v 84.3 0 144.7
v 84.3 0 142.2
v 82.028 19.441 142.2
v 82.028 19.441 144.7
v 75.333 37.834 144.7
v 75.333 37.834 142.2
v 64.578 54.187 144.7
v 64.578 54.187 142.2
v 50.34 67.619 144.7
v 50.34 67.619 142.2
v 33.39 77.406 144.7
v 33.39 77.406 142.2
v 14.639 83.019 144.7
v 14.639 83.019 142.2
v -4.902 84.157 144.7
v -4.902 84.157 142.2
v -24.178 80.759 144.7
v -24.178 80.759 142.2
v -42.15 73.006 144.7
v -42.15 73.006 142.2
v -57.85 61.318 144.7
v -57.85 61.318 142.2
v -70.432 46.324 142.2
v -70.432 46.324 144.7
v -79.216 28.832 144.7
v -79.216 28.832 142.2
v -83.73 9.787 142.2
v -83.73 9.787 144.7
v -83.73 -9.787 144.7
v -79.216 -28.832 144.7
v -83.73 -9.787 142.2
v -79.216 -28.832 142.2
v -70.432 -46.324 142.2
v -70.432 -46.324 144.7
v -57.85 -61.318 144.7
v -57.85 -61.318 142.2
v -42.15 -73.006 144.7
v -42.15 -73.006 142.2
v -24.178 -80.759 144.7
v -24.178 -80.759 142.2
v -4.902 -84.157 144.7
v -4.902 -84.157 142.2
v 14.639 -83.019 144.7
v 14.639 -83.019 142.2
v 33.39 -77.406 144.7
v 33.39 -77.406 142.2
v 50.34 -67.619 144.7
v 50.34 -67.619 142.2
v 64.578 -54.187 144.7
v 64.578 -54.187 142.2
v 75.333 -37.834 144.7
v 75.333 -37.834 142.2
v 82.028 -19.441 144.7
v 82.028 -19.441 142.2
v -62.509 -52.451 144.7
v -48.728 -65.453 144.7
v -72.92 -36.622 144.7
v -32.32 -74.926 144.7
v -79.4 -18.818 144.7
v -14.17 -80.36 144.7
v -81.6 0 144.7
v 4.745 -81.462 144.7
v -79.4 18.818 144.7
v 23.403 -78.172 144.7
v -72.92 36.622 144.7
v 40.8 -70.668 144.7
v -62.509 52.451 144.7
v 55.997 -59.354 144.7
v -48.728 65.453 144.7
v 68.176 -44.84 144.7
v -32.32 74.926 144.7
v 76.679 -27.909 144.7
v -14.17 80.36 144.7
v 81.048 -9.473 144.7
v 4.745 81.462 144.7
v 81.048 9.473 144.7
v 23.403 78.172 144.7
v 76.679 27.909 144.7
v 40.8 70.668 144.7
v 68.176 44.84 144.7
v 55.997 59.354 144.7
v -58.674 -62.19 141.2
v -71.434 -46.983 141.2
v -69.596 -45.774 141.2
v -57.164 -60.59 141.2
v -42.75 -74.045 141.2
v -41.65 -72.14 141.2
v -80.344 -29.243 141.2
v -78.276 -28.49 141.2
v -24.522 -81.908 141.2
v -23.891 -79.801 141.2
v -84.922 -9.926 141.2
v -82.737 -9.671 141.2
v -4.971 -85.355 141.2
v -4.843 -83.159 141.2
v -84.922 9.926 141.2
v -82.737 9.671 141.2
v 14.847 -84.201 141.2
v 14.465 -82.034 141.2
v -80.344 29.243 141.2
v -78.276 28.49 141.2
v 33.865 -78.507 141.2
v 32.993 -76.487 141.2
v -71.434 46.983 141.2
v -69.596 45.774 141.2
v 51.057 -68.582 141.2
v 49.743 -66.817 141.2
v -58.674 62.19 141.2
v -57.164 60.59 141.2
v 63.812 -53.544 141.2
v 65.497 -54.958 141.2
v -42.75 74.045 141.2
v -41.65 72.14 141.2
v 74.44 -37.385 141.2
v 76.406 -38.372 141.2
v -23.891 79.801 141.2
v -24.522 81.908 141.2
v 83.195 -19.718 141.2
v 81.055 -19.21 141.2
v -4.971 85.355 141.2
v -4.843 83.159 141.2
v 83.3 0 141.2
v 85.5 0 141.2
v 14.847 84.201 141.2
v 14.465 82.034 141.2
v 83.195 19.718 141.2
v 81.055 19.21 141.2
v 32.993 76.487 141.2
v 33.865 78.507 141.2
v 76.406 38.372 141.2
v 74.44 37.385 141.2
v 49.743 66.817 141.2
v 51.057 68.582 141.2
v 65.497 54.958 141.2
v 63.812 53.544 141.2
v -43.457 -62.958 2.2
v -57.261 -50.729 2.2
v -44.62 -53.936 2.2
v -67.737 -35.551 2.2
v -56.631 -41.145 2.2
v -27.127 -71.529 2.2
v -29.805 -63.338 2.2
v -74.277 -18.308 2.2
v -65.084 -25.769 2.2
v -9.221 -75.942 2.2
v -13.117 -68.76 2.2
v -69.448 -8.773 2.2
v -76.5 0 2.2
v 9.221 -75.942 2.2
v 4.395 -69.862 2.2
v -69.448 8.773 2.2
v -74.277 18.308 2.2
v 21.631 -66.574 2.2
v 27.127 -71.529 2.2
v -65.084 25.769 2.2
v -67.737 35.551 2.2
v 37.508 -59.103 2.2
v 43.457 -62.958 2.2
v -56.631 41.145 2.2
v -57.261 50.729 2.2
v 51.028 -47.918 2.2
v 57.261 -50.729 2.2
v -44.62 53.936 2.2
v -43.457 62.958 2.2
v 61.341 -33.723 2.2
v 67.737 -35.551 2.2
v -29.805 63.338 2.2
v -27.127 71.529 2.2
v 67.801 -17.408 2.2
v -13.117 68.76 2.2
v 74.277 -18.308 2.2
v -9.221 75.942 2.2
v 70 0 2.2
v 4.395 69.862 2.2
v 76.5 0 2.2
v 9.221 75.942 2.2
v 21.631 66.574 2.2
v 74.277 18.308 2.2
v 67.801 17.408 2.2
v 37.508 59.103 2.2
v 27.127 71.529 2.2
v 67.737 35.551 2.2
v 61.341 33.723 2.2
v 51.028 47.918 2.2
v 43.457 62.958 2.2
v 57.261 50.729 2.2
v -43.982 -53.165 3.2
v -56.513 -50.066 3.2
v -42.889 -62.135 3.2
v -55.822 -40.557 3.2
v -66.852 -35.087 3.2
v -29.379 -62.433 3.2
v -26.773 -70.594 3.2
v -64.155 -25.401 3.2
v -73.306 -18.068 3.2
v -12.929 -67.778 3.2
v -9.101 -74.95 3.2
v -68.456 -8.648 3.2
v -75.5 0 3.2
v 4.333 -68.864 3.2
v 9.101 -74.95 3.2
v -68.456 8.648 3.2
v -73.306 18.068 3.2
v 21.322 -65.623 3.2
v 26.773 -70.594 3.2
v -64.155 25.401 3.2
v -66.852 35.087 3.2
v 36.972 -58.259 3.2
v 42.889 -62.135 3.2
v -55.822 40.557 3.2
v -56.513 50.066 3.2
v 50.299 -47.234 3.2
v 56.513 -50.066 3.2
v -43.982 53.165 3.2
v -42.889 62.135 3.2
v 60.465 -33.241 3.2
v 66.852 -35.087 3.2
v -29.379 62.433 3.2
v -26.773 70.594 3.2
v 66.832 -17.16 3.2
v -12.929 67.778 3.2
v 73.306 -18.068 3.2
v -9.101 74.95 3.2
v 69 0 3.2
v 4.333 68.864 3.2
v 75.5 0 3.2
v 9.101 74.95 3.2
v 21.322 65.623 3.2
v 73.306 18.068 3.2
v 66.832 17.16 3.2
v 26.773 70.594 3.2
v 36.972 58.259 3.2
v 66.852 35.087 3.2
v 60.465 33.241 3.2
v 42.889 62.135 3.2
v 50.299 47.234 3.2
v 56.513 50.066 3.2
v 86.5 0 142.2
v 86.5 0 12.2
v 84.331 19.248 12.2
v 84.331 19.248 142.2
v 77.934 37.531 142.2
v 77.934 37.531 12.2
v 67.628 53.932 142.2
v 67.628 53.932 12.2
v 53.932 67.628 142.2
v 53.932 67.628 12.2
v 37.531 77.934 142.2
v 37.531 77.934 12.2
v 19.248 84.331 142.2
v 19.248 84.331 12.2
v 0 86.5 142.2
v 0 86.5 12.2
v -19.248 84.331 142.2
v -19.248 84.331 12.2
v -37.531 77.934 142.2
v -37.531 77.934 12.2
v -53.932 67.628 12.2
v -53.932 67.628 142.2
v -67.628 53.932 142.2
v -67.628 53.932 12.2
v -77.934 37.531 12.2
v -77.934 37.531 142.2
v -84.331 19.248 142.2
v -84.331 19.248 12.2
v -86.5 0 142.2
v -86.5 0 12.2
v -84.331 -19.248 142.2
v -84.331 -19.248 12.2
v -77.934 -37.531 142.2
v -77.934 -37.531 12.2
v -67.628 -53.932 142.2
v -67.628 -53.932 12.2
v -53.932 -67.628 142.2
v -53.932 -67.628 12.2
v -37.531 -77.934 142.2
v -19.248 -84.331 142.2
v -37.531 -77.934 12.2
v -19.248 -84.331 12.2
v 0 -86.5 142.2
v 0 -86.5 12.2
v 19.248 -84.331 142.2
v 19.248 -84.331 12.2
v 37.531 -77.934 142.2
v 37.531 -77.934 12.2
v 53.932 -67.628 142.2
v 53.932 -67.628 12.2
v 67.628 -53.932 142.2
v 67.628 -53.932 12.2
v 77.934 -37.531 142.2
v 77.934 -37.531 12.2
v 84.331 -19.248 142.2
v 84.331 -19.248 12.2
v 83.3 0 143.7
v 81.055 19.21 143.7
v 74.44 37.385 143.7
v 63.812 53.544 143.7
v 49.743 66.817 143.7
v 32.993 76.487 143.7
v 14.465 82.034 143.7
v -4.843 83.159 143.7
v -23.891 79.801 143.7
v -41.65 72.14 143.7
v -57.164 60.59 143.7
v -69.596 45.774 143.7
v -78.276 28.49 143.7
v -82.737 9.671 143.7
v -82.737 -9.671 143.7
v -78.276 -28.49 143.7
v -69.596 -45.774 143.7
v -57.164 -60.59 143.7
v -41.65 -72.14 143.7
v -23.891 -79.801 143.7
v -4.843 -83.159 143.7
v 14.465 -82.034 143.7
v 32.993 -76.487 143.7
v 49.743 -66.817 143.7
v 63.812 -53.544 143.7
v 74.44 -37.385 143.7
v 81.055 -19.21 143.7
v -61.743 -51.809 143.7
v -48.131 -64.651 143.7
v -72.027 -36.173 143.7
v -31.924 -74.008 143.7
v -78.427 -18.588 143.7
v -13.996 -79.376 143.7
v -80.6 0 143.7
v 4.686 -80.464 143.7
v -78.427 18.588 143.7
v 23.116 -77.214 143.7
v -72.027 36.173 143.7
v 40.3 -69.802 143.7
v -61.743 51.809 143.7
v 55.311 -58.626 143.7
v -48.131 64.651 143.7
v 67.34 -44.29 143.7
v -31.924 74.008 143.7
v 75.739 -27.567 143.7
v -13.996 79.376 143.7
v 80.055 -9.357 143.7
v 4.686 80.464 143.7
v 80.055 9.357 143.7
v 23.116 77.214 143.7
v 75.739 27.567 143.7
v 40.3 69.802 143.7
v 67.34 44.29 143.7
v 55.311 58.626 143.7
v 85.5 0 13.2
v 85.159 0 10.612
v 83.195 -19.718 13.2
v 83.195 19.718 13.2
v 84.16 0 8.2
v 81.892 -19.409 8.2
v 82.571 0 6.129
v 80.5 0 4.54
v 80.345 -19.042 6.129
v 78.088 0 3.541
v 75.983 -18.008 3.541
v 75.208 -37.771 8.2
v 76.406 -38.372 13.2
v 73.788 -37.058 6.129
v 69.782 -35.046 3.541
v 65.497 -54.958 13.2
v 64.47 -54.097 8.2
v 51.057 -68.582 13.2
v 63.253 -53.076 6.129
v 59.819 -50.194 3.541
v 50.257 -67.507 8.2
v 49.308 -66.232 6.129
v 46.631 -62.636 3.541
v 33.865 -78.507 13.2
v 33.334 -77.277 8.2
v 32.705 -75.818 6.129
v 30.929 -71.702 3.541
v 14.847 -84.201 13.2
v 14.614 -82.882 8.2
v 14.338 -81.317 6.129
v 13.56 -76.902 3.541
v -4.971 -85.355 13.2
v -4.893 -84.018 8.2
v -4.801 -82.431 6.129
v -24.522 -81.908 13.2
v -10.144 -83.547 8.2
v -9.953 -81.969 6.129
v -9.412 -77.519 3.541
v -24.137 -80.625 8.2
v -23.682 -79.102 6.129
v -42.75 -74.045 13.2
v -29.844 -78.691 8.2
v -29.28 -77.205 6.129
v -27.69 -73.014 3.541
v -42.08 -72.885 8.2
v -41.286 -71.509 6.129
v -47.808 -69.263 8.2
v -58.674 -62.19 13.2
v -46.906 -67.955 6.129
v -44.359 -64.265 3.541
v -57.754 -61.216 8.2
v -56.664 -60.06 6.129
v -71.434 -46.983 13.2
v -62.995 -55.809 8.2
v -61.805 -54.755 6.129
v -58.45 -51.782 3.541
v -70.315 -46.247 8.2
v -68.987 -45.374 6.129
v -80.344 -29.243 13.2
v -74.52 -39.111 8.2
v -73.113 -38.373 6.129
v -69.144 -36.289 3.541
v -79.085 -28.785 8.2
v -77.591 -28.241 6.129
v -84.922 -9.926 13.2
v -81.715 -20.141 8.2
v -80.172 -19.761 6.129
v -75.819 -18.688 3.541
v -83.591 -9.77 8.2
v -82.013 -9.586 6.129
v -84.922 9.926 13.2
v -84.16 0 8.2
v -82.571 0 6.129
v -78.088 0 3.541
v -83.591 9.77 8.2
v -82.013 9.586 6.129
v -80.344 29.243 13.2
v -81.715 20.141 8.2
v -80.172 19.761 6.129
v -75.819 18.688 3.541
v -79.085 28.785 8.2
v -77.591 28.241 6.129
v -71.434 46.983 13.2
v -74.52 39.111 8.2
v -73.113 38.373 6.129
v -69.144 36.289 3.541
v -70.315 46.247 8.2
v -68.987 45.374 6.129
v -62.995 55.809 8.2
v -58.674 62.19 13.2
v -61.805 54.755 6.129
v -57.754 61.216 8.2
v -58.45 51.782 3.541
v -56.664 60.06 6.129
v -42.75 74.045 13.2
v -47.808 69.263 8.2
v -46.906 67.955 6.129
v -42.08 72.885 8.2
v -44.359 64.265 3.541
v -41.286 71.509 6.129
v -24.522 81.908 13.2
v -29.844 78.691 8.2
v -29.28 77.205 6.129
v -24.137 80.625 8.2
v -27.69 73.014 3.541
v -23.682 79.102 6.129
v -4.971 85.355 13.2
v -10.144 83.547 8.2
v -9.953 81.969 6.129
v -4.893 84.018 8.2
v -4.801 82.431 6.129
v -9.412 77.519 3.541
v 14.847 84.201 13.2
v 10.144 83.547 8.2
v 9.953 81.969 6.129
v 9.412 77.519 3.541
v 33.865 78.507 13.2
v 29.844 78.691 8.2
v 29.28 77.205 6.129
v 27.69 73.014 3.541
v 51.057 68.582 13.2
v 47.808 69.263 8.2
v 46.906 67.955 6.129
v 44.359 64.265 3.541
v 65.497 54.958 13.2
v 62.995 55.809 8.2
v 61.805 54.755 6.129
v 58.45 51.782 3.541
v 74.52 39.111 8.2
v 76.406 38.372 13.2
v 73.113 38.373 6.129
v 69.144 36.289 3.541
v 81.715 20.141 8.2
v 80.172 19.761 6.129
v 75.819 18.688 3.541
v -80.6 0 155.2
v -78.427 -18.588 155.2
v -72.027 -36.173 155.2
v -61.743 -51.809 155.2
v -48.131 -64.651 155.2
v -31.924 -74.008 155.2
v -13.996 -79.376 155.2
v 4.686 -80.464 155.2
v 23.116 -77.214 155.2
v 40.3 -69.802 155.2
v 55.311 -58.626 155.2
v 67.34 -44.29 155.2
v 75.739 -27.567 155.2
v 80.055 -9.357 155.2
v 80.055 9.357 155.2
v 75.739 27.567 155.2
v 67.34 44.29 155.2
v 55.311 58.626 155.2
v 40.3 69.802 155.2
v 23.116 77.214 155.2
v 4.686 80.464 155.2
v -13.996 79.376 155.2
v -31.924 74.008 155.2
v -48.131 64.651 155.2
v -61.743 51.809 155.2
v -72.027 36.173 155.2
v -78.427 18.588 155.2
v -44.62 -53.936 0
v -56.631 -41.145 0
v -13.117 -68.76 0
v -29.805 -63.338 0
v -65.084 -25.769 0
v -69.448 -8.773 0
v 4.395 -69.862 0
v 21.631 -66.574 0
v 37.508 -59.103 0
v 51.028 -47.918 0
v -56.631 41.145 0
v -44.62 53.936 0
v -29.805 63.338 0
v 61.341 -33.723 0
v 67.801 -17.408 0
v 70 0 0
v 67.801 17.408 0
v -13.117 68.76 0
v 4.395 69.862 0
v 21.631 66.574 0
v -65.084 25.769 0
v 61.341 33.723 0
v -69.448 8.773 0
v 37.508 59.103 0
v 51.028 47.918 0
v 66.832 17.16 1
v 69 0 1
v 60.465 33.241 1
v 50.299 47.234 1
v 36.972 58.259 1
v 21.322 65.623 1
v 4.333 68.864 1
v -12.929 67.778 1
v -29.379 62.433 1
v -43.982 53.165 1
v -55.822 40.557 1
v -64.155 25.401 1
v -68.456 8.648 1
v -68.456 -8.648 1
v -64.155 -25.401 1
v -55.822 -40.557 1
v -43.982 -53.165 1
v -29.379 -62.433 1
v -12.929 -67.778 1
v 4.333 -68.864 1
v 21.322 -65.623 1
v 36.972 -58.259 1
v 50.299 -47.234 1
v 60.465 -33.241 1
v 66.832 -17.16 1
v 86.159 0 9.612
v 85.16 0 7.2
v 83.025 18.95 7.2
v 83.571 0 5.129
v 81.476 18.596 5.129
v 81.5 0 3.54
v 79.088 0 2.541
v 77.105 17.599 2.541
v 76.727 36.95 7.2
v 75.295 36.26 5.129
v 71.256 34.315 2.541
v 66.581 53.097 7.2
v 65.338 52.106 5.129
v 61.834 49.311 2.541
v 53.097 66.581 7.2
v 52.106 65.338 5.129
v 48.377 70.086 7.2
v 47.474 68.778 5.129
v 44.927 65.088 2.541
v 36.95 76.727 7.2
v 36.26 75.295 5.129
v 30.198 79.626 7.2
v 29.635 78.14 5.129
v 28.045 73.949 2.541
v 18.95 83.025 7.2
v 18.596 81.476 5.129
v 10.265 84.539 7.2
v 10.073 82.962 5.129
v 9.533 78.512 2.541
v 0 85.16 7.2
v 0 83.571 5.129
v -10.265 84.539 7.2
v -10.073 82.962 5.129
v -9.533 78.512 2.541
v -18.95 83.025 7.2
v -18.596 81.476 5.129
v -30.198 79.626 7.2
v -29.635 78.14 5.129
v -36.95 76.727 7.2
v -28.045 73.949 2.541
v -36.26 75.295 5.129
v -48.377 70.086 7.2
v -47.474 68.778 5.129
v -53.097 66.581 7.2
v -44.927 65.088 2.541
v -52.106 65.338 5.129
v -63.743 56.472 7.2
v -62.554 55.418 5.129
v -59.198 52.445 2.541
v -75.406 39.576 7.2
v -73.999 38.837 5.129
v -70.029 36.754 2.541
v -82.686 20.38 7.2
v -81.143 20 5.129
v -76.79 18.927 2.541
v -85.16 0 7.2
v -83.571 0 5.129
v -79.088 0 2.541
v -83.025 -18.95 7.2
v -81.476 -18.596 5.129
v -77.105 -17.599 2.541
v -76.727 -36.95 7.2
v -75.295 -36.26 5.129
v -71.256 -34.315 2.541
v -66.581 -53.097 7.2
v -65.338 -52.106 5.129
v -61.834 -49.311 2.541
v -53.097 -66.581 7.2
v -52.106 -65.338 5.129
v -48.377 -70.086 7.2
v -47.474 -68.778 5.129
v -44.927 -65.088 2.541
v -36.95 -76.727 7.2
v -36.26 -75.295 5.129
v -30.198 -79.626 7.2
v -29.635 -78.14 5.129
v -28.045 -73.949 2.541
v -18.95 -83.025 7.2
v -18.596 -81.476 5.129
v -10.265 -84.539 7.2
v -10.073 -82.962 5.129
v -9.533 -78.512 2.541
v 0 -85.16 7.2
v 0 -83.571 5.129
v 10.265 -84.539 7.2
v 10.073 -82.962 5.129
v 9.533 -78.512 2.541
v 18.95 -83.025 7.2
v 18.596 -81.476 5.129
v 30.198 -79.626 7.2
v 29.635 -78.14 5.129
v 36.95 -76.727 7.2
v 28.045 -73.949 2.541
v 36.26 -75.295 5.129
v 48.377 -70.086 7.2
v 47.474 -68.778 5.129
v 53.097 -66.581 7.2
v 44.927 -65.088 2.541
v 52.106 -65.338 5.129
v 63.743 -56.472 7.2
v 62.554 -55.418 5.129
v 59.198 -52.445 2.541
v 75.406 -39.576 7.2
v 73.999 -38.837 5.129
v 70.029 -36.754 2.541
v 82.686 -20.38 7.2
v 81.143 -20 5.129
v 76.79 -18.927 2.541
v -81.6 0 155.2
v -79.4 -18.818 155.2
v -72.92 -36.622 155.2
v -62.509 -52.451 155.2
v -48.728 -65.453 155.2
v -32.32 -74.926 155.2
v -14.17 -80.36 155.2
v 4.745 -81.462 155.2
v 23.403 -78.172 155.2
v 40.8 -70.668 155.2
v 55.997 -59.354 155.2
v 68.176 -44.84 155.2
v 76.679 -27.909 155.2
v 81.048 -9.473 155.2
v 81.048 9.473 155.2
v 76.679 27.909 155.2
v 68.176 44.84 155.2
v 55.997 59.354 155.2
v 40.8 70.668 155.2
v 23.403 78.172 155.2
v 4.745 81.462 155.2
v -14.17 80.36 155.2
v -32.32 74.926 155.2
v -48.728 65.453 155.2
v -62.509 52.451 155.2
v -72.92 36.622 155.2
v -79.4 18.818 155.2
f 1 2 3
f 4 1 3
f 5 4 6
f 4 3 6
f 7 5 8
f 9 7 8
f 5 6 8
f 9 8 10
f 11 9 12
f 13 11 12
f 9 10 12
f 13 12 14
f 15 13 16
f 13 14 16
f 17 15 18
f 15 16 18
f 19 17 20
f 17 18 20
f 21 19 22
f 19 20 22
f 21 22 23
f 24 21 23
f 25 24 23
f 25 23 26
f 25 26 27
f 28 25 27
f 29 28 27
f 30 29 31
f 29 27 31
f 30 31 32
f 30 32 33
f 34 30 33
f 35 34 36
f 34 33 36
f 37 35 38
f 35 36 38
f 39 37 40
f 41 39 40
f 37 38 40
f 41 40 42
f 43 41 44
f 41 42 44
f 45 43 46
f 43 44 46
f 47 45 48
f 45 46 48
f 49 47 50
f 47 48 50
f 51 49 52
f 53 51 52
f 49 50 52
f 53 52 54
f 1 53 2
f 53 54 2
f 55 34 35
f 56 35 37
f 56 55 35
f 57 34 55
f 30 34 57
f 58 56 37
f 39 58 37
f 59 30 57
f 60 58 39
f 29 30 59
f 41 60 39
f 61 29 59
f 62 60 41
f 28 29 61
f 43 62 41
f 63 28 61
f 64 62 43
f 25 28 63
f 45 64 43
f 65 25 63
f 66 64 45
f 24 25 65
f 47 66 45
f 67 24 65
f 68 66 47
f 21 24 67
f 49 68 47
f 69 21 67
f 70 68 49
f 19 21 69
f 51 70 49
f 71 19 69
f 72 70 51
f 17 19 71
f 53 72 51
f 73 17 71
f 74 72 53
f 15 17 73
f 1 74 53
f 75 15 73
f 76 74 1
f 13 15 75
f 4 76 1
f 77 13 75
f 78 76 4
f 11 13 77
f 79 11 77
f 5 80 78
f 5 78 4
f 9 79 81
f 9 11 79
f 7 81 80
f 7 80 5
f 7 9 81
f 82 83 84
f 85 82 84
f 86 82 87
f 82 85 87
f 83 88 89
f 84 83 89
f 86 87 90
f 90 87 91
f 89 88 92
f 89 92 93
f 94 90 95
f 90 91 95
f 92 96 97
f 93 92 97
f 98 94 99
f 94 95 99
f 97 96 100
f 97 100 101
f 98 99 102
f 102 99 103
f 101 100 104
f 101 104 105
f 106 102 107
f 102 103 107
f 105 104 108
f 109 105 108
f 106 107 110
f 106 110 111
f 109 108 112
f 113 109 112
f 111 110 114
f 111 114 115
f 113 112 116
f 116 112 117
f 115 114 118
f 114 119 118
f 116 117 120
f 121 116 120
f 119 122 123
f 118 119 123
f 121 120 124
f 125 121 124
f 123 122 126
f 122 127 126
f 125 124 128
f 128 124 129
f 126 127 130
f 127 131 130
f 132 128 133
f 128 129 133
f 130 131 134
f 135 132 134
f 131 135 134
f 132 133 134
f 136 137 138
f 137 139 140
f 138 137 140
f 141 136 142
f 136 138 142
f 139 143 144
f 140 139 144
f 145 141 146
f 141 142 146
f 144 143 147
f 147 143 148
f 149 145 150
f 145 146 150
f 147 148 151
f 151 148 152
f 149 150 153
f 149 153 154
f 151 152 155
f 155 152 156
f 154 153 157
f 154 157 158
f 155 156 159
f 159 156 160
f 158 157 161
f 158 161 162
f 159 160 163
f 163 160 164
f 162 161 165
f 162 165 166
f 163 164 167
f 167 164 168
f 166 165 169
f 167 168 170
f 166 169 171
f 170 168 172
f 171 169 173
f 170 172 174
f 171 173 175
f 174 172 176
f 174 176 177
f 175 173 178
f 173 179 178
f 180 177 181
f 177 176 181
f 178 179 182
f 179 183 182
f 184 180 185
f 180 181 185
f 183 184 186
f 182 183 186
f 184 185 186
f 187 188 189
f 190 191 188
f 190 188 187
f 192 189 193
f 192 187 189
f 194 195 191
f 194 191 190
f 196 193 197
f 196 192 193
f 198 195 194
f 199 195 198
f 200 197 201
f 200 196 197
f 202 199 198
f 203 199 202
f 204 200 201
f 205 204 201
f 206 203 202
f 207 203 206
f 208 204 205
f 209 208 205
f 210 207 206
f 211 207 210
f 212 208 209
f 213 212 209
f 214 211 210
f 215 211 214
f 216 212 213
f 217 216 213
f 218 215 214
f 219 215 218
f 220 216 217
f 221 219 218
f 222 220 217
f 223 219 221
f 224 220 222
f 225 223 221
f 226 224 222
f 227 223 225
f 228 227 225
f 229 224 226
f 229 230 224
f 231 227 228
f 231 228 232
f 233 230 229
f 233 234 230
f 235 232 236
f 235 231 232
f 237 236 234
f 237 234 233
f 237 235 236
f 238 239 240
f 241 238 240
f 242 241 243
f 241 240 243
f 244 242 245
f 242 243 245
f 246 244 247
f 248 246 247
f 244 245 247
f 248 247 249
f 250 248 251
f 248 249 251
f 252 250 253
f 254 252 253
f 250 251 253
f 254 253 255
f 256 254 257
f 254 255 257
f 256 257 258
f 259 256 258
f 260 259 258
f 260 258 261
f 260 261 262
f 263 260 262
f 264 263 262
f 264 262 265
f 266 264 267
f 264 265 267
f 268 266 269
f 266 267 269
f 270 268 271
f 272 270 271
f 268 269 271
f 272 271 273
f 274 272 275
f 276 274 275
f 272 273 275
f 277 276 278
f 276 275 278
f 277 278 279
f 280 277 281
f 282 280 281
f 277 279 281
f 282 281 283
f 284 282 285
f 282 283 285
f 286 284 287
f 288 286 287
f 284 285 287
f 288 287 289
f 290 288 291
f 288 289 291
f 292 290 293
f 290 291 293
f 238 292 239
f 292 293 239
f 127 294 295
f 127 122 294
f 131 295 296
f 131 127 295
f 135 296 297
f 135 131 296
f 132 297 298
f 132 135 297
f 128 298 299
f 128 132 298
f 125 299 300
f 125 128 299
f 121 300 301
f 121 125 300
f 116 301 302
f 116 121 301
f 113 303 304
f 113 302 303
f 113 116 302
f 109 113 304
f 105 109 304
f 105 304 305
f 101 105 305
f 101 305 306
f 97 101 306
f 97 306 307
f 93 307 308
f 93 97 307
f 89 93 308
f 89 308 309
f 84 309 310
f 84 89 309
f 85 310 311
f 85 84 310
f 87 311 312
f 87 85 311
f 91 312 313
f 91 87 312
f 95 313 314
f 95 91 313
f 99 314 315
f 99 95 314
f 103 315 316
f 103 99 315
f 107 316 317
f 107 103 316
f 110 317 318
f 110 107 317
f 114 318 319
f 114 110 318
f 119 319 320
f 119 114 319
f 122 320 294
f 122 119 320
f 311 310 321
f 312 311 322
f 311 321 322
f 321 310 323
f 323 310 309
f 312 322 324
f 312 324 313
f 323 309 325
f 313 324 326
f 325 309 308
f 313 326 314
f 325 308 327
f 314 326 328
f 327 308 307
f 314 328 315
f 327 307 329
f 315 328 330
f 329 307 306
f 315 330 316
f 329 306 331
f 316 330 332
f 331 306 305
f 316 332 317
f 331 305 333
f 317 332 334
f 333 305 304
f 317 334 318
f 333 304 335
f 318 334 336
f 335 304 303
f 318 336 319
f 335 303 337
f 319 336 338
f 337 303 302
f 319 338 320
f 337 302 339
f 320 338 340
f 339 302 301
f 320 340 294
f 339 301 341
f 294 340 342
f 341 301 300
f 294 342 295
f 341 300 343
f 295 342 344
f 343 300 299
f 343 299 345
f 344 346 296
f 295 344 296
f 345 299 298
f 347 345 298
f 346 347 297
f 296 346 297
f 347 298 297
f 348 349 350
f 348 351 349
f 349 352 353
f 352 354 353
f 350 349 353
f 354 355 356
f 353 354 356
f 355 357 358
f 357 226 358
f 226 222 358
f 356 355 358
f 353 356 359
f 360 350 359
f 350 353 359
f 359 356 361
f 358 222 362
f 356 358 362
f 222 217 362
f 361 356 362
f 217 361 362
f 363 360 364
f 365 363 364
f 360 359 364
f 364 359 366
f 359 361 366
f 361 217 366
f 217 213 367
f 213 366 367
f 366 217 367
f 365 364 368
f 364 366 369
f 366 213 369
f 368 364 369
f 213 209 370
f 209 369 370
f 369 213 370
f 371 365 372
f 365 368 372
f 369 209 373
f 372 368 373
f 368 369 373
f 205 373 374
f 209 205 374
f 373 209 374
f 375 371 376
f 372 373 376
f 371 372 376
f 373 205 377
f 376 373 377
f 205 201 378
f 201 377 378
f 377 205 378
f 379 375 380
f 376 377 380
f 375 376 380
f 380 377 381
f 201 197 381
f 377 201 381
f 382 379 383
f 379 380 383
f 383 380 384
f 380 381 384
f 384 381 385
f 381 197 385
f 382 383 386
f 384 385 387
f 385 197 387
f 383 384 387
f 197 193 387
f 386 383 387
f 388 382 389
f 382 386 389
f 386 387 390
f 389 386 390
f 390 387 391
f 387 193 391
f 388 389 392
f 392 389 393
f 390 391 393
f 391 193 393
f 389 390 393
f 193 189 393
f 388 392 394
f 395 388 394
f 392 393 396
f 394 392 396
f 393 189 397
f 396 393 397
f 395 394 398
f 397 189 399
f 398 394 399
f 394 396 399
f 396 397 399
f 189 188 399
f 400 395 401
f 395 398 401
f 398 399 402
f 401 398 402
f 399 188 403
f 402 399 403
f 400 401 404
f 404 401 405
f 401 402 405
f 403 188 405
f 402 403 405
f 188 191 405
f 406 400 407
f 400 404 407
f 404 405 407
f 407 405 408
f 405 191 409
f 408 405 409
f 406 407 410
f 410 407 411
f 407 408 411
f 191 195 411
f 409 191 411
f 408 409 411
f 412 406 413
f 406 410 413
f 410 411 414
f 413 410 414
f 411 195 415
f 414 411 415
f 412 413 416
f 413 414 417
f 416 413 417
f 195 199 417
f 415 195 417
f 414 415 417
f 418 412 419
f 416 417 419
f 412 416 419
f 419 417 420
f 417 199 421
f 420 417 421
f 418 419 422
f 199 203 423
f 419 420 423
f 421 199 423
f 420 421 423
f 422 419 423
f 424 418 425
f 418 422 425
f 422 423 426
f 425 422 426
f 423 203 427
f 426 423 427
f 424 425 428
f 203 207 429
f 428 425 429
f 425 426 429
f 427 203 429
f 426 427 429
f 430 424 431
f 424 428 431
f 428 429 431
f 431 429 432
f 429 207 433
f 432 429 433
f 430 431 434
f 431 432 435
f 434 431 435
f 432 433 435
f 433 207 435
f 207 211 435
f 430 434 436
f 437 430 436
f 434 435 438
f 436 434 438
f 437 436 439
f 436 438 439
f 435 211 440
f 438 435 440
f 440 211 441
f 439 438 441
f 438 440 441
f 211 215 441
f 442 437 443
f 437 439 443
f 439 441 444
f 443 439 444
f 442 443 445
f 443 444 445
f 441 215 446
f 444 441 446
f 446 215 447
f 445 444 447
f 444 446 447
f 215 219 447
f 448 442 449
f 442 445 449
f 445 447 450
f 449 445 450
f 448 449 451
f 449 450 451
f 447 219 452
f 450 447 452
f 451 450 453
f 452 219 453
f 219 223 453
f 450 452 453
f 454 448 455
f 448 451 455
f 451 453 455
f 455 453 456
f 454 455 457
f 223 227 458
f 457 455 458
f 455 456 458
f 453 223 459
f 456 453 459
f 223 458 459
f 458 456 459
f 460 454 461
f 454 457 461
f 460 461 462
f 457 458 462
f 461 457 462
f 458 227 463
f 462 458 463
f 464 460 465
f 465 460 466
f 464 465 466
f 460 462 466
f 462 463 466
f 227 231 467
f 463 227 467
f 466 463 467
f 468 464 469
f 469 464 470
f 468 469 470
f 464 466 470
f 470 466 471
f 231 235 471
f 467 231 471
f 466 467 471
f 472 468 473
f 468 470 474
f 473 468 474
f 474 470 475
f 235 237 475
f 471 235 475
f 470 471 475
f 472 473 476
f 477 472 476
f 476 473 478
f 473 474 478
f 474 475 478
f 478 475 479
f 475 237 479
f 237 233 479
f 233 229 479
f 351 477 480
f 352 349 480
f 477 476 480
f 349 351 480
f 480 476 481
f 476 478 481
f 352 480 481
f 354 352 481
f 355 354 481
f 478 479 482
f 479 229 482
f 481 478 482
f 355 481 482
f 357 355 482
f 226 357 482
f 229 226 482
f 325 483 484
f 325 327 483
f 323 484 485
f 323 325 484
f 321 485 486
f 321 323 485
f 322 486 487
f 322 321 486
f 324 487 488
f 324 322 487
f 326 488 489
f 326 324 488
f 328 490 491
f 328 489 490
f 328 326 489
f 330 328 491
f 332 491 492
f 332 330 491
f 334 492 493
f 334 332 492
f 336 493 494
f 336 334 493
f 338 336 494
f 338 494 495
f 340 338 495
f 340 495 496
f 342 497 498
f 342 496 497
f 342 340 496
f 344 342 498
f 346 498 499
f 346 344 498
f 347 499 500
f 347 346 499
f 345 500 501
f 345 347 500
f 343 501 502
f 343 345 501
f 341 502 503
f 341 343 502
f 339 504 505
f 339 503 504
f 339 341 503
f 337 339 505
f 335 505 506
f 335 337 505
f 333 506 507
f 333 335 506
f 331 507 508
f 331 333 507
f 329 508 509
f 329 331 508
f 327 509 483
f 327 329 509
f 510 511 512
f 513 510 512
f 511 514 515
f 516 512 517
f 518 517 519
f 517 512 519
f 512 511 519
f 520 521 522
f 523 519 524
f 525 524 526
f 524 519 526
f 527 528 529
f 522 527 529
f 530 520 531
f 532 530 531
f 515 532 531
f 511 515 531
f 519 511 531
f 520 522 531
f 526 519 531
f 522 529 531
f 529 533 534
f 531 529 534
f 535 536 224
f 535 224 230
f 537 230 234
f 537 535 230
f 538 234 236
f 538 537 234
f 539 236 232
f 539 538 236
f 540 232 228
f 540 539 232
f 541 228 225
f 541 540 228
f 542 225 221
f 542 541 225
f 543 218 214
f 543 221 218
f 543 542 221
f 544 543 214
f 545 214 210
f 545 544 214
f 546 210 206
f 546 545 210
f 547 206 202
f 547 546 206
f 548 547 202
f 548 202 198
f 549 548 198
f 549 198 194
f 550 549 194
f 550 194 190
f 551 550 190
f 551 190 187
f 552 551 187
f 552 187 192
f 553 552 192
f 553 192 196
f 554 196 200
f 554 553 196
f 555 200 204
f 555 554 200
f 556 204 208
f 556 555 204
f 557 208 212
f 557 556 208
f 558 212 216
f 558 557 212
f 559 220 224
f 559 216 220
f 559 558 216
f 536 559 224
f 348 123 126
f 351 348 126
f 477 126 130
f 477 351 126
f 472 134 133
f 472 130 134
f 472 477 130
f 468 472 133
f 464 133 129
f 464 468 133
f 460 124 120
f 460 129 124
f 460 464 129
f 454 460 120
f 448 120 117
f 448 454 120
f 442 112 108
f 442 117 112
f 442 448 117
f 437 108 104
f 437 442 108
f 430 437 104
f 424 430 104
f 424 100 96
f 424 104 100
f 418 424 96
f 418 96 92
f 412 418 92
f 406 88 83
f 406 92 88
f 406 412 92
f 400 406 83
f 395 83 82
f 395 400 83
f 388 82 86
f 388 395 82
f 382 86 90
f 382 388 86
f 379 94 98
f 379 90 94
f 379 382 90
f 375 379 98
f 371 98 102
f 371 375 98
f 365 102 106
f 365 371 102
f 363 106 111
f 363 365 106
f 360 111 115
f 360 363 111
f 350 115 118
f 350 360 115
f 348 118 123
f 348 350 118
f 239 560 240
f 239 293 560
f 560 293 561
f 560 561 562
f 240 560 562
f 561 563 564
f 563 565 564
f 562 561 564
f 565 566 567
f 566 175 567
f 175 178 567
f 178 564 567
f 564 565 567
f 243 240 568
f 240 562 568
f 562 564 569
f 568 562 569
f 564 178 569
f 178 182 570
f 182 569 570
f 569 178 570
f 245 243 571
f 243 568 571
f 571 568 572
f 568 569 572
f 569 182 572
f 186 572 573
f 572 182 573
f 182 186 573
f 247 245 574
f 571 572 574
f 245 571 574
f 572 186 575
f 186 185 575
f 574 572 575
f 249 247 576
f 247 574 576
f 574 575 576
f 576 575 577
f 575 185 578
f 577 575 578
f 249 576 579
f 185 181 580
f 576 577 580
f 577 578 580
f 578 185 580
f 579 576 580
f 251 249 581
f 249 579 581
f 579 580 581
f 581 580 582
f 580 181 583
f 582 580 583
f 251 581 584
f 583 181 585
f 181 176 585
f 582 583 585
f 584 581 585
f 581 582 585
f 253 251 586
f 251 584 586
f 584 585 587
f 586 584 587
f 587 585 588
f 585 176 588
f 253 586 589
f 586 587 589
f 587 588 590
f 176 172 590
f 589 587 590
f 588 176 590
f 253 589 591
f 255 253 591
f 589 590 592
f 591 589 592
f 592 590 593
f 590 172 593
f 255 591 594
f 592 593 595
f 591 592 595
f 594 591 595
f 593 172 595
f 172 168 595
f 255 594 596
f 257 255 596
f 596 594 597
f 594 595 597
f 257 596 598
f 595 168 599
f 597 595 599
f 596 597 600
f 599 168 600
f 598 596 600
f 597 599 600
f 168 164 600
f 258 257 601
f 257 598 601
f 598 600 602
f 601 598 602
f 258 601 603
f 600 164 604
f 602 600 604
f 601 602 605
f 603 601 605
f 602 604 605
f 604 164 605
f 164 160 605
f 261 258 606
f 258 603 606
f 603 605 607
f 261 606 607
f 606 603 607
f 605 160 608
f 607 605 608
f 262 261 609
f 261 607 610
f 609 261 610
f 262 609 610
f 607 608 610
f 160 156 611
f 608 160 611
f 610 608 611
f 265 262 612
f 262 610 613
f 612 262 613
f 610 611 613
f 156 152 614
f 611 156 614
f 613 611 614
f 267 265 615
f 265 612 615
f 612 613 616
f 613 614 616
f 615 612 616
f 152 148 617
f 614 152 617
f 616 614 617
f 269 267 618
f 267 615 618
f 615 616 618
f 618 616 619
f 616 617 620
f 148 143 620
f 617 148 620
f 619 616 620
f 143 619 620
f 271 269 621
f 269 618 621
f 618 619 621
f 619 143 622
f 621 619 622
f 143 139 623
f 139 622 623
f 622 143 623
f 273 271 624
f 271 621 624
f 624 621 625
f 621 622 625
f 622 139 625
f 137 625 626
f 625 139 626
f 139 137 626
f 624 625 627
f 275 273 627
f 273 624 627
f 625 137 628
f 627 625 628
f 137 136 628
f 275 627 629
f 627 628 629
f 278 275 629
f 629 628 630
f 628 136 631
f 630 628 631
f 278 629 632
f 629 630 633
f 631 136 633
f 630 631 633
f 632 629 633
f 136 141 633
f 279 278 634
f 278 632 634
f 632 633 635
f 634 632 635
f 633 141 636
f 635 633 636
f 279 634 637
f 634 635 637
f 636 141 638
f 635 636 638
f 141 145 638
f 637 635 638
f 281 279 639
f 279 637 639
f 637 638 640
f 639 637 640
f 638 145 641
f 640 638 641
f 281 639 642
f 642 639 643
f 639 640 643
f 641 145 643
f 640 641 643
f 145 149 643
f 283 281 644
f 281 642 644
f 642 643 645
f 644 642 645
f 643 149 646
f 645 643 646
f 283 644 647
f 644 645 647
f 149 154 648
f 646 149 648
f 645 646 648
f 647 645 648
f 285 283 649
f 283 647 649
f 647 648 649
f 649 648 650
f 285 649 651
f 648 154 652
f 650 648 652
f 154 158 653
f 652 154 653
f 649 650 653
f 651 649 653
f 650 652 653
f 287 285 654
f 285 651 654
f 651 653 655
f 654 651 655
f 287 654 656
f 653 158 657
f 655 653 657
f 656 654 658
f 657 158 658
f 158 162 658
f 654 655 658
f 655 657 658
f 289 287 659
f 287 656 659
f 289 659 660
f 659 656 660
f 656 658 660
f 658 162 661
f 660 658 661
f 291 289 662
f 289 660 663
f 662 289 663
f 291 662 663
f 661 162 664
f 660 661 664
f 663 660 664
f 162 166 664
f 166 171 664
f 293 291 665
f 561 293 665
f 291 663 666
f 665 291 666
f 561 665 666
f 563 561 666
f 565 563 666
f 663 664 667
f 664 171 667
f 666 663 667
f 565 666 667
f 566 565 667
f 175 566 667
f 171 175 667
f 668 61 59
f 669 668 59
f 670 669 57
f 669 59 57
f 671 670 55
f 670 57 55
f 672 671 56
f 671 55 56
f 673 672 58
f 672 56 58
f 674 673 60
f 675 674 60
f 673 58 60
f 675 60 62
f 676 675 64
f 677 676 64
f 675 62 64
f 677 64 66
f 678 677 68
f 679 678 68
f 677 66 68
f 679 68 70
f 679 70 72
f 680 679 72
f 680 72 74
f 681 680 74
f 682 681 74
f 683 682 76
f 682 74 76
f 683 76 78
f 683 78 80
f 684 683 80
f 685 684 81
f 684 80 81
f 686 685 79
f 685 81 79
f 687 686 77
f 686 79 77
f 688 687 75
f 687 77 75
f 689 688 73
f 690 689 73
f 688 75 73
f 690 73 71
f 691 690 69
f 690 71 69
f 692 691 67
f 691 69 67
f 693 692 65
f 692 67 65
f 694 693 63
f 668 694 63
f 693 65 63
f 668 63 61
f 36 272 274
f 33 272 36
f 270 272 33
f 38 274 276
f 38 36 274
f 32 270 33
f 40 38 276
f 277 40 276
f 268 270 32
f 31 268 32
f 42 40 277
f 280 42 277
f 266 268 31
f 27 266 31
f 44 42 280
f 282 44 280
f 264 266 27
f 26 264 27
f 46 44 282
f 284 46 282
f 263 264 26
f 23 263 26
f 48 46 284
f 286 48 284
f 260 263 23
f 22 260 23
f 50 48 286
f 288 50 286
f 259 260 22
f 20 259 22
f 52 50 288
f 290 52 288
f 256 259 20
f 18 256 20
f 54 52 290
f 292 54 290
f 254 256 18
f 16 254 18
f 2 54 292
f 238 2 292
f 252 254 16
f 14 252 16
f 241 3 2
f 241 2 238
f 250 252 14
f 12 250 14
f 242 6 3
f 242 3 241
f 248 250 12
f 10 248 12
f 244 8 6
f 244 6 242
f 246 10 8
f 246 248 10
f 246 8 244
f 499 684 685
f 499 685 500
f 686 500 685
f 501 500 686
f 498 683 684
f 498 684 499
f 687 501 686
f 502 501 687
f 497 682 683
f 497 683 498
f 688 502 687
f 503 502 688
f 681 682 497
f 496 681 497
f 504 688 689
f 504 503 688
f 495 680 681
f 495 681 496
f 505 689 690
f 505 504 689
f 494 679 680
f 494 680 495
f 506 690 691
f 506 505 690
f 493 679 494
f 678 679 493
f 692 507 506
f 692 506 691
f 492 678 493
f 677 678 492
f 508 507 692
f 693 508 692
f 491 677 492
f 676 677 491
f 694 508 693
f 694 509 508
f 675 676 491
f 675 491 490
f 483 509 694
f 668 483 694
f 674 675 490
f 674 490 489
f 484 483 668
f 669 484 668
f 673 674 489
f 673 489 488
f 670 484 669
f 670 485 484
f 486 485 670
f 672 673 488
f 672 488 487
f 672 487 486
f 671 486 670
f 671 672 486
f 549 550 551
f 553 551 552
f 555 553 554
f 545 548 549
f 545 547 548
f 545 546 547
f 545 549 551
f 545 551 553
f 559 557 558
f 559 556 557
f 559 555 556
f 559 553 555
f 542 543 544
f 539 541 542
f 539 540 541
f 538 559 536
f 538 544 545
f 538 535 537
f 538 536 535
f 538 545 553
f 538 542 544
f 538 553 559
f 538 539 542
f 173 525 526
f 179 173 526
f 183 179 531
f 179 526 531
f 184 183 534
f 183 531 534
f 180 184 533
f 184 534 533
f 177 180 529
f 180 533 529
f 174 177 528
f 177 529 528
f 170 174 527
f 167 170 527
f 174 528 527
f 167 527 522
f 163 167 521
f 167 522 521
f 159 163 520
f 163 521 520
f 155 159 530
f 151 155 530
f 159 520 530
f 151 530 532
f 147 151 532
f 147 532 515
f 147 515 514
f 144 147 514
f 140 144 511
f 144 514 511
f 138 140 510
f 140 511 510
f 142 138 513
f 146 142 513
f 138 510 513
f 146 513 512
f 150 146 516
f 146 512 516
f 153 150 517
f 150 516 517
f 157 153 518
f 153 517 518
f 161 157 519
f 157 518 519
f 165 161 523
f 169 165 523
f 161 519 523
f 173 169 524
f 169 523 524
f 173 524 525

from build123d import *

# Parameters (mm, degrees)
SCHIZZO1_R                   = 70
ESTRUSIONE_ESTRUSIONE1_DEPTH = 2.2
SCHIZZO2_R                   = 86.5
ESTRUSIONE_ESTRUSIONE2_DEPTH = 140
SCHIZZO3_R                   = 84.3
ESTRUSIONE_ESTRUSIONE3_DEPTH = 2.5
SCHIZZO4_R                   = 81.6
ESTRUSIONE_ESTRUSIONE4_DEPTH = 10.5
SVUOTA1_T                    = -1
RACCORDO1_R                  = 10


with BuildPart() as part:
    # Schizzo1 → Estrusione-Estrusione1 (new body)
    with BuildSketch(Plane.XY):
        Circle(SCHIZZO1_R)
    extrude(amount=ESTRUSIONE_ESTRUSIONE1_DEPTH)

    # Schizzo2 → Estrusione-Estrusione2 (add)
    with BuildSketch(Plane.XY.offset(2.2)):
        Circle(SCHIZZO2_R)
    extrude(amount=ESTRUSIONE_ESTRUSIONE2_DEPTH)

    # Schizzo3 → Estrusione-Estrusione3 (add)
    with BuildSketch(Plane.XY.offset(142.2)):
        Circle(SCHIZZO3_R)
    extrude(amount=ESTRUSIONE_ESTRUSIONE3_DEPTH)

    # Schizzo4 → Estrusione-Estrusione4 (add)
    with BuildSketch(Plane.XY.offset(144.7)):
        with Locations(Location((0, 0, 0), (0, 0, 180))):
            Circle(SCHIZZO4_R)
    extrude(amount=ESTRUSIONE_ESTRUSIONE4_DEPTH)

    # Svuota1
    svuota1_openings = [part.faces().sort_by_distance(p)[0] for p in [
        (0, 0, 155.2),
    ]]
    offset(amount=SVUOTA1_T, openings=svuota1_openings, kind=Kind.INTERSECTION)

    # Raccordo1
    raccordo1_edges = [part.edges().sort_by_distance(p)[0] for p in [
        (-85.5, 0, 3.2),
        (-86.5, 0, 2.2),
    ]]
    fillet(raccordo1_edges, radius=RACCORDO1_R)


solid = part.part
